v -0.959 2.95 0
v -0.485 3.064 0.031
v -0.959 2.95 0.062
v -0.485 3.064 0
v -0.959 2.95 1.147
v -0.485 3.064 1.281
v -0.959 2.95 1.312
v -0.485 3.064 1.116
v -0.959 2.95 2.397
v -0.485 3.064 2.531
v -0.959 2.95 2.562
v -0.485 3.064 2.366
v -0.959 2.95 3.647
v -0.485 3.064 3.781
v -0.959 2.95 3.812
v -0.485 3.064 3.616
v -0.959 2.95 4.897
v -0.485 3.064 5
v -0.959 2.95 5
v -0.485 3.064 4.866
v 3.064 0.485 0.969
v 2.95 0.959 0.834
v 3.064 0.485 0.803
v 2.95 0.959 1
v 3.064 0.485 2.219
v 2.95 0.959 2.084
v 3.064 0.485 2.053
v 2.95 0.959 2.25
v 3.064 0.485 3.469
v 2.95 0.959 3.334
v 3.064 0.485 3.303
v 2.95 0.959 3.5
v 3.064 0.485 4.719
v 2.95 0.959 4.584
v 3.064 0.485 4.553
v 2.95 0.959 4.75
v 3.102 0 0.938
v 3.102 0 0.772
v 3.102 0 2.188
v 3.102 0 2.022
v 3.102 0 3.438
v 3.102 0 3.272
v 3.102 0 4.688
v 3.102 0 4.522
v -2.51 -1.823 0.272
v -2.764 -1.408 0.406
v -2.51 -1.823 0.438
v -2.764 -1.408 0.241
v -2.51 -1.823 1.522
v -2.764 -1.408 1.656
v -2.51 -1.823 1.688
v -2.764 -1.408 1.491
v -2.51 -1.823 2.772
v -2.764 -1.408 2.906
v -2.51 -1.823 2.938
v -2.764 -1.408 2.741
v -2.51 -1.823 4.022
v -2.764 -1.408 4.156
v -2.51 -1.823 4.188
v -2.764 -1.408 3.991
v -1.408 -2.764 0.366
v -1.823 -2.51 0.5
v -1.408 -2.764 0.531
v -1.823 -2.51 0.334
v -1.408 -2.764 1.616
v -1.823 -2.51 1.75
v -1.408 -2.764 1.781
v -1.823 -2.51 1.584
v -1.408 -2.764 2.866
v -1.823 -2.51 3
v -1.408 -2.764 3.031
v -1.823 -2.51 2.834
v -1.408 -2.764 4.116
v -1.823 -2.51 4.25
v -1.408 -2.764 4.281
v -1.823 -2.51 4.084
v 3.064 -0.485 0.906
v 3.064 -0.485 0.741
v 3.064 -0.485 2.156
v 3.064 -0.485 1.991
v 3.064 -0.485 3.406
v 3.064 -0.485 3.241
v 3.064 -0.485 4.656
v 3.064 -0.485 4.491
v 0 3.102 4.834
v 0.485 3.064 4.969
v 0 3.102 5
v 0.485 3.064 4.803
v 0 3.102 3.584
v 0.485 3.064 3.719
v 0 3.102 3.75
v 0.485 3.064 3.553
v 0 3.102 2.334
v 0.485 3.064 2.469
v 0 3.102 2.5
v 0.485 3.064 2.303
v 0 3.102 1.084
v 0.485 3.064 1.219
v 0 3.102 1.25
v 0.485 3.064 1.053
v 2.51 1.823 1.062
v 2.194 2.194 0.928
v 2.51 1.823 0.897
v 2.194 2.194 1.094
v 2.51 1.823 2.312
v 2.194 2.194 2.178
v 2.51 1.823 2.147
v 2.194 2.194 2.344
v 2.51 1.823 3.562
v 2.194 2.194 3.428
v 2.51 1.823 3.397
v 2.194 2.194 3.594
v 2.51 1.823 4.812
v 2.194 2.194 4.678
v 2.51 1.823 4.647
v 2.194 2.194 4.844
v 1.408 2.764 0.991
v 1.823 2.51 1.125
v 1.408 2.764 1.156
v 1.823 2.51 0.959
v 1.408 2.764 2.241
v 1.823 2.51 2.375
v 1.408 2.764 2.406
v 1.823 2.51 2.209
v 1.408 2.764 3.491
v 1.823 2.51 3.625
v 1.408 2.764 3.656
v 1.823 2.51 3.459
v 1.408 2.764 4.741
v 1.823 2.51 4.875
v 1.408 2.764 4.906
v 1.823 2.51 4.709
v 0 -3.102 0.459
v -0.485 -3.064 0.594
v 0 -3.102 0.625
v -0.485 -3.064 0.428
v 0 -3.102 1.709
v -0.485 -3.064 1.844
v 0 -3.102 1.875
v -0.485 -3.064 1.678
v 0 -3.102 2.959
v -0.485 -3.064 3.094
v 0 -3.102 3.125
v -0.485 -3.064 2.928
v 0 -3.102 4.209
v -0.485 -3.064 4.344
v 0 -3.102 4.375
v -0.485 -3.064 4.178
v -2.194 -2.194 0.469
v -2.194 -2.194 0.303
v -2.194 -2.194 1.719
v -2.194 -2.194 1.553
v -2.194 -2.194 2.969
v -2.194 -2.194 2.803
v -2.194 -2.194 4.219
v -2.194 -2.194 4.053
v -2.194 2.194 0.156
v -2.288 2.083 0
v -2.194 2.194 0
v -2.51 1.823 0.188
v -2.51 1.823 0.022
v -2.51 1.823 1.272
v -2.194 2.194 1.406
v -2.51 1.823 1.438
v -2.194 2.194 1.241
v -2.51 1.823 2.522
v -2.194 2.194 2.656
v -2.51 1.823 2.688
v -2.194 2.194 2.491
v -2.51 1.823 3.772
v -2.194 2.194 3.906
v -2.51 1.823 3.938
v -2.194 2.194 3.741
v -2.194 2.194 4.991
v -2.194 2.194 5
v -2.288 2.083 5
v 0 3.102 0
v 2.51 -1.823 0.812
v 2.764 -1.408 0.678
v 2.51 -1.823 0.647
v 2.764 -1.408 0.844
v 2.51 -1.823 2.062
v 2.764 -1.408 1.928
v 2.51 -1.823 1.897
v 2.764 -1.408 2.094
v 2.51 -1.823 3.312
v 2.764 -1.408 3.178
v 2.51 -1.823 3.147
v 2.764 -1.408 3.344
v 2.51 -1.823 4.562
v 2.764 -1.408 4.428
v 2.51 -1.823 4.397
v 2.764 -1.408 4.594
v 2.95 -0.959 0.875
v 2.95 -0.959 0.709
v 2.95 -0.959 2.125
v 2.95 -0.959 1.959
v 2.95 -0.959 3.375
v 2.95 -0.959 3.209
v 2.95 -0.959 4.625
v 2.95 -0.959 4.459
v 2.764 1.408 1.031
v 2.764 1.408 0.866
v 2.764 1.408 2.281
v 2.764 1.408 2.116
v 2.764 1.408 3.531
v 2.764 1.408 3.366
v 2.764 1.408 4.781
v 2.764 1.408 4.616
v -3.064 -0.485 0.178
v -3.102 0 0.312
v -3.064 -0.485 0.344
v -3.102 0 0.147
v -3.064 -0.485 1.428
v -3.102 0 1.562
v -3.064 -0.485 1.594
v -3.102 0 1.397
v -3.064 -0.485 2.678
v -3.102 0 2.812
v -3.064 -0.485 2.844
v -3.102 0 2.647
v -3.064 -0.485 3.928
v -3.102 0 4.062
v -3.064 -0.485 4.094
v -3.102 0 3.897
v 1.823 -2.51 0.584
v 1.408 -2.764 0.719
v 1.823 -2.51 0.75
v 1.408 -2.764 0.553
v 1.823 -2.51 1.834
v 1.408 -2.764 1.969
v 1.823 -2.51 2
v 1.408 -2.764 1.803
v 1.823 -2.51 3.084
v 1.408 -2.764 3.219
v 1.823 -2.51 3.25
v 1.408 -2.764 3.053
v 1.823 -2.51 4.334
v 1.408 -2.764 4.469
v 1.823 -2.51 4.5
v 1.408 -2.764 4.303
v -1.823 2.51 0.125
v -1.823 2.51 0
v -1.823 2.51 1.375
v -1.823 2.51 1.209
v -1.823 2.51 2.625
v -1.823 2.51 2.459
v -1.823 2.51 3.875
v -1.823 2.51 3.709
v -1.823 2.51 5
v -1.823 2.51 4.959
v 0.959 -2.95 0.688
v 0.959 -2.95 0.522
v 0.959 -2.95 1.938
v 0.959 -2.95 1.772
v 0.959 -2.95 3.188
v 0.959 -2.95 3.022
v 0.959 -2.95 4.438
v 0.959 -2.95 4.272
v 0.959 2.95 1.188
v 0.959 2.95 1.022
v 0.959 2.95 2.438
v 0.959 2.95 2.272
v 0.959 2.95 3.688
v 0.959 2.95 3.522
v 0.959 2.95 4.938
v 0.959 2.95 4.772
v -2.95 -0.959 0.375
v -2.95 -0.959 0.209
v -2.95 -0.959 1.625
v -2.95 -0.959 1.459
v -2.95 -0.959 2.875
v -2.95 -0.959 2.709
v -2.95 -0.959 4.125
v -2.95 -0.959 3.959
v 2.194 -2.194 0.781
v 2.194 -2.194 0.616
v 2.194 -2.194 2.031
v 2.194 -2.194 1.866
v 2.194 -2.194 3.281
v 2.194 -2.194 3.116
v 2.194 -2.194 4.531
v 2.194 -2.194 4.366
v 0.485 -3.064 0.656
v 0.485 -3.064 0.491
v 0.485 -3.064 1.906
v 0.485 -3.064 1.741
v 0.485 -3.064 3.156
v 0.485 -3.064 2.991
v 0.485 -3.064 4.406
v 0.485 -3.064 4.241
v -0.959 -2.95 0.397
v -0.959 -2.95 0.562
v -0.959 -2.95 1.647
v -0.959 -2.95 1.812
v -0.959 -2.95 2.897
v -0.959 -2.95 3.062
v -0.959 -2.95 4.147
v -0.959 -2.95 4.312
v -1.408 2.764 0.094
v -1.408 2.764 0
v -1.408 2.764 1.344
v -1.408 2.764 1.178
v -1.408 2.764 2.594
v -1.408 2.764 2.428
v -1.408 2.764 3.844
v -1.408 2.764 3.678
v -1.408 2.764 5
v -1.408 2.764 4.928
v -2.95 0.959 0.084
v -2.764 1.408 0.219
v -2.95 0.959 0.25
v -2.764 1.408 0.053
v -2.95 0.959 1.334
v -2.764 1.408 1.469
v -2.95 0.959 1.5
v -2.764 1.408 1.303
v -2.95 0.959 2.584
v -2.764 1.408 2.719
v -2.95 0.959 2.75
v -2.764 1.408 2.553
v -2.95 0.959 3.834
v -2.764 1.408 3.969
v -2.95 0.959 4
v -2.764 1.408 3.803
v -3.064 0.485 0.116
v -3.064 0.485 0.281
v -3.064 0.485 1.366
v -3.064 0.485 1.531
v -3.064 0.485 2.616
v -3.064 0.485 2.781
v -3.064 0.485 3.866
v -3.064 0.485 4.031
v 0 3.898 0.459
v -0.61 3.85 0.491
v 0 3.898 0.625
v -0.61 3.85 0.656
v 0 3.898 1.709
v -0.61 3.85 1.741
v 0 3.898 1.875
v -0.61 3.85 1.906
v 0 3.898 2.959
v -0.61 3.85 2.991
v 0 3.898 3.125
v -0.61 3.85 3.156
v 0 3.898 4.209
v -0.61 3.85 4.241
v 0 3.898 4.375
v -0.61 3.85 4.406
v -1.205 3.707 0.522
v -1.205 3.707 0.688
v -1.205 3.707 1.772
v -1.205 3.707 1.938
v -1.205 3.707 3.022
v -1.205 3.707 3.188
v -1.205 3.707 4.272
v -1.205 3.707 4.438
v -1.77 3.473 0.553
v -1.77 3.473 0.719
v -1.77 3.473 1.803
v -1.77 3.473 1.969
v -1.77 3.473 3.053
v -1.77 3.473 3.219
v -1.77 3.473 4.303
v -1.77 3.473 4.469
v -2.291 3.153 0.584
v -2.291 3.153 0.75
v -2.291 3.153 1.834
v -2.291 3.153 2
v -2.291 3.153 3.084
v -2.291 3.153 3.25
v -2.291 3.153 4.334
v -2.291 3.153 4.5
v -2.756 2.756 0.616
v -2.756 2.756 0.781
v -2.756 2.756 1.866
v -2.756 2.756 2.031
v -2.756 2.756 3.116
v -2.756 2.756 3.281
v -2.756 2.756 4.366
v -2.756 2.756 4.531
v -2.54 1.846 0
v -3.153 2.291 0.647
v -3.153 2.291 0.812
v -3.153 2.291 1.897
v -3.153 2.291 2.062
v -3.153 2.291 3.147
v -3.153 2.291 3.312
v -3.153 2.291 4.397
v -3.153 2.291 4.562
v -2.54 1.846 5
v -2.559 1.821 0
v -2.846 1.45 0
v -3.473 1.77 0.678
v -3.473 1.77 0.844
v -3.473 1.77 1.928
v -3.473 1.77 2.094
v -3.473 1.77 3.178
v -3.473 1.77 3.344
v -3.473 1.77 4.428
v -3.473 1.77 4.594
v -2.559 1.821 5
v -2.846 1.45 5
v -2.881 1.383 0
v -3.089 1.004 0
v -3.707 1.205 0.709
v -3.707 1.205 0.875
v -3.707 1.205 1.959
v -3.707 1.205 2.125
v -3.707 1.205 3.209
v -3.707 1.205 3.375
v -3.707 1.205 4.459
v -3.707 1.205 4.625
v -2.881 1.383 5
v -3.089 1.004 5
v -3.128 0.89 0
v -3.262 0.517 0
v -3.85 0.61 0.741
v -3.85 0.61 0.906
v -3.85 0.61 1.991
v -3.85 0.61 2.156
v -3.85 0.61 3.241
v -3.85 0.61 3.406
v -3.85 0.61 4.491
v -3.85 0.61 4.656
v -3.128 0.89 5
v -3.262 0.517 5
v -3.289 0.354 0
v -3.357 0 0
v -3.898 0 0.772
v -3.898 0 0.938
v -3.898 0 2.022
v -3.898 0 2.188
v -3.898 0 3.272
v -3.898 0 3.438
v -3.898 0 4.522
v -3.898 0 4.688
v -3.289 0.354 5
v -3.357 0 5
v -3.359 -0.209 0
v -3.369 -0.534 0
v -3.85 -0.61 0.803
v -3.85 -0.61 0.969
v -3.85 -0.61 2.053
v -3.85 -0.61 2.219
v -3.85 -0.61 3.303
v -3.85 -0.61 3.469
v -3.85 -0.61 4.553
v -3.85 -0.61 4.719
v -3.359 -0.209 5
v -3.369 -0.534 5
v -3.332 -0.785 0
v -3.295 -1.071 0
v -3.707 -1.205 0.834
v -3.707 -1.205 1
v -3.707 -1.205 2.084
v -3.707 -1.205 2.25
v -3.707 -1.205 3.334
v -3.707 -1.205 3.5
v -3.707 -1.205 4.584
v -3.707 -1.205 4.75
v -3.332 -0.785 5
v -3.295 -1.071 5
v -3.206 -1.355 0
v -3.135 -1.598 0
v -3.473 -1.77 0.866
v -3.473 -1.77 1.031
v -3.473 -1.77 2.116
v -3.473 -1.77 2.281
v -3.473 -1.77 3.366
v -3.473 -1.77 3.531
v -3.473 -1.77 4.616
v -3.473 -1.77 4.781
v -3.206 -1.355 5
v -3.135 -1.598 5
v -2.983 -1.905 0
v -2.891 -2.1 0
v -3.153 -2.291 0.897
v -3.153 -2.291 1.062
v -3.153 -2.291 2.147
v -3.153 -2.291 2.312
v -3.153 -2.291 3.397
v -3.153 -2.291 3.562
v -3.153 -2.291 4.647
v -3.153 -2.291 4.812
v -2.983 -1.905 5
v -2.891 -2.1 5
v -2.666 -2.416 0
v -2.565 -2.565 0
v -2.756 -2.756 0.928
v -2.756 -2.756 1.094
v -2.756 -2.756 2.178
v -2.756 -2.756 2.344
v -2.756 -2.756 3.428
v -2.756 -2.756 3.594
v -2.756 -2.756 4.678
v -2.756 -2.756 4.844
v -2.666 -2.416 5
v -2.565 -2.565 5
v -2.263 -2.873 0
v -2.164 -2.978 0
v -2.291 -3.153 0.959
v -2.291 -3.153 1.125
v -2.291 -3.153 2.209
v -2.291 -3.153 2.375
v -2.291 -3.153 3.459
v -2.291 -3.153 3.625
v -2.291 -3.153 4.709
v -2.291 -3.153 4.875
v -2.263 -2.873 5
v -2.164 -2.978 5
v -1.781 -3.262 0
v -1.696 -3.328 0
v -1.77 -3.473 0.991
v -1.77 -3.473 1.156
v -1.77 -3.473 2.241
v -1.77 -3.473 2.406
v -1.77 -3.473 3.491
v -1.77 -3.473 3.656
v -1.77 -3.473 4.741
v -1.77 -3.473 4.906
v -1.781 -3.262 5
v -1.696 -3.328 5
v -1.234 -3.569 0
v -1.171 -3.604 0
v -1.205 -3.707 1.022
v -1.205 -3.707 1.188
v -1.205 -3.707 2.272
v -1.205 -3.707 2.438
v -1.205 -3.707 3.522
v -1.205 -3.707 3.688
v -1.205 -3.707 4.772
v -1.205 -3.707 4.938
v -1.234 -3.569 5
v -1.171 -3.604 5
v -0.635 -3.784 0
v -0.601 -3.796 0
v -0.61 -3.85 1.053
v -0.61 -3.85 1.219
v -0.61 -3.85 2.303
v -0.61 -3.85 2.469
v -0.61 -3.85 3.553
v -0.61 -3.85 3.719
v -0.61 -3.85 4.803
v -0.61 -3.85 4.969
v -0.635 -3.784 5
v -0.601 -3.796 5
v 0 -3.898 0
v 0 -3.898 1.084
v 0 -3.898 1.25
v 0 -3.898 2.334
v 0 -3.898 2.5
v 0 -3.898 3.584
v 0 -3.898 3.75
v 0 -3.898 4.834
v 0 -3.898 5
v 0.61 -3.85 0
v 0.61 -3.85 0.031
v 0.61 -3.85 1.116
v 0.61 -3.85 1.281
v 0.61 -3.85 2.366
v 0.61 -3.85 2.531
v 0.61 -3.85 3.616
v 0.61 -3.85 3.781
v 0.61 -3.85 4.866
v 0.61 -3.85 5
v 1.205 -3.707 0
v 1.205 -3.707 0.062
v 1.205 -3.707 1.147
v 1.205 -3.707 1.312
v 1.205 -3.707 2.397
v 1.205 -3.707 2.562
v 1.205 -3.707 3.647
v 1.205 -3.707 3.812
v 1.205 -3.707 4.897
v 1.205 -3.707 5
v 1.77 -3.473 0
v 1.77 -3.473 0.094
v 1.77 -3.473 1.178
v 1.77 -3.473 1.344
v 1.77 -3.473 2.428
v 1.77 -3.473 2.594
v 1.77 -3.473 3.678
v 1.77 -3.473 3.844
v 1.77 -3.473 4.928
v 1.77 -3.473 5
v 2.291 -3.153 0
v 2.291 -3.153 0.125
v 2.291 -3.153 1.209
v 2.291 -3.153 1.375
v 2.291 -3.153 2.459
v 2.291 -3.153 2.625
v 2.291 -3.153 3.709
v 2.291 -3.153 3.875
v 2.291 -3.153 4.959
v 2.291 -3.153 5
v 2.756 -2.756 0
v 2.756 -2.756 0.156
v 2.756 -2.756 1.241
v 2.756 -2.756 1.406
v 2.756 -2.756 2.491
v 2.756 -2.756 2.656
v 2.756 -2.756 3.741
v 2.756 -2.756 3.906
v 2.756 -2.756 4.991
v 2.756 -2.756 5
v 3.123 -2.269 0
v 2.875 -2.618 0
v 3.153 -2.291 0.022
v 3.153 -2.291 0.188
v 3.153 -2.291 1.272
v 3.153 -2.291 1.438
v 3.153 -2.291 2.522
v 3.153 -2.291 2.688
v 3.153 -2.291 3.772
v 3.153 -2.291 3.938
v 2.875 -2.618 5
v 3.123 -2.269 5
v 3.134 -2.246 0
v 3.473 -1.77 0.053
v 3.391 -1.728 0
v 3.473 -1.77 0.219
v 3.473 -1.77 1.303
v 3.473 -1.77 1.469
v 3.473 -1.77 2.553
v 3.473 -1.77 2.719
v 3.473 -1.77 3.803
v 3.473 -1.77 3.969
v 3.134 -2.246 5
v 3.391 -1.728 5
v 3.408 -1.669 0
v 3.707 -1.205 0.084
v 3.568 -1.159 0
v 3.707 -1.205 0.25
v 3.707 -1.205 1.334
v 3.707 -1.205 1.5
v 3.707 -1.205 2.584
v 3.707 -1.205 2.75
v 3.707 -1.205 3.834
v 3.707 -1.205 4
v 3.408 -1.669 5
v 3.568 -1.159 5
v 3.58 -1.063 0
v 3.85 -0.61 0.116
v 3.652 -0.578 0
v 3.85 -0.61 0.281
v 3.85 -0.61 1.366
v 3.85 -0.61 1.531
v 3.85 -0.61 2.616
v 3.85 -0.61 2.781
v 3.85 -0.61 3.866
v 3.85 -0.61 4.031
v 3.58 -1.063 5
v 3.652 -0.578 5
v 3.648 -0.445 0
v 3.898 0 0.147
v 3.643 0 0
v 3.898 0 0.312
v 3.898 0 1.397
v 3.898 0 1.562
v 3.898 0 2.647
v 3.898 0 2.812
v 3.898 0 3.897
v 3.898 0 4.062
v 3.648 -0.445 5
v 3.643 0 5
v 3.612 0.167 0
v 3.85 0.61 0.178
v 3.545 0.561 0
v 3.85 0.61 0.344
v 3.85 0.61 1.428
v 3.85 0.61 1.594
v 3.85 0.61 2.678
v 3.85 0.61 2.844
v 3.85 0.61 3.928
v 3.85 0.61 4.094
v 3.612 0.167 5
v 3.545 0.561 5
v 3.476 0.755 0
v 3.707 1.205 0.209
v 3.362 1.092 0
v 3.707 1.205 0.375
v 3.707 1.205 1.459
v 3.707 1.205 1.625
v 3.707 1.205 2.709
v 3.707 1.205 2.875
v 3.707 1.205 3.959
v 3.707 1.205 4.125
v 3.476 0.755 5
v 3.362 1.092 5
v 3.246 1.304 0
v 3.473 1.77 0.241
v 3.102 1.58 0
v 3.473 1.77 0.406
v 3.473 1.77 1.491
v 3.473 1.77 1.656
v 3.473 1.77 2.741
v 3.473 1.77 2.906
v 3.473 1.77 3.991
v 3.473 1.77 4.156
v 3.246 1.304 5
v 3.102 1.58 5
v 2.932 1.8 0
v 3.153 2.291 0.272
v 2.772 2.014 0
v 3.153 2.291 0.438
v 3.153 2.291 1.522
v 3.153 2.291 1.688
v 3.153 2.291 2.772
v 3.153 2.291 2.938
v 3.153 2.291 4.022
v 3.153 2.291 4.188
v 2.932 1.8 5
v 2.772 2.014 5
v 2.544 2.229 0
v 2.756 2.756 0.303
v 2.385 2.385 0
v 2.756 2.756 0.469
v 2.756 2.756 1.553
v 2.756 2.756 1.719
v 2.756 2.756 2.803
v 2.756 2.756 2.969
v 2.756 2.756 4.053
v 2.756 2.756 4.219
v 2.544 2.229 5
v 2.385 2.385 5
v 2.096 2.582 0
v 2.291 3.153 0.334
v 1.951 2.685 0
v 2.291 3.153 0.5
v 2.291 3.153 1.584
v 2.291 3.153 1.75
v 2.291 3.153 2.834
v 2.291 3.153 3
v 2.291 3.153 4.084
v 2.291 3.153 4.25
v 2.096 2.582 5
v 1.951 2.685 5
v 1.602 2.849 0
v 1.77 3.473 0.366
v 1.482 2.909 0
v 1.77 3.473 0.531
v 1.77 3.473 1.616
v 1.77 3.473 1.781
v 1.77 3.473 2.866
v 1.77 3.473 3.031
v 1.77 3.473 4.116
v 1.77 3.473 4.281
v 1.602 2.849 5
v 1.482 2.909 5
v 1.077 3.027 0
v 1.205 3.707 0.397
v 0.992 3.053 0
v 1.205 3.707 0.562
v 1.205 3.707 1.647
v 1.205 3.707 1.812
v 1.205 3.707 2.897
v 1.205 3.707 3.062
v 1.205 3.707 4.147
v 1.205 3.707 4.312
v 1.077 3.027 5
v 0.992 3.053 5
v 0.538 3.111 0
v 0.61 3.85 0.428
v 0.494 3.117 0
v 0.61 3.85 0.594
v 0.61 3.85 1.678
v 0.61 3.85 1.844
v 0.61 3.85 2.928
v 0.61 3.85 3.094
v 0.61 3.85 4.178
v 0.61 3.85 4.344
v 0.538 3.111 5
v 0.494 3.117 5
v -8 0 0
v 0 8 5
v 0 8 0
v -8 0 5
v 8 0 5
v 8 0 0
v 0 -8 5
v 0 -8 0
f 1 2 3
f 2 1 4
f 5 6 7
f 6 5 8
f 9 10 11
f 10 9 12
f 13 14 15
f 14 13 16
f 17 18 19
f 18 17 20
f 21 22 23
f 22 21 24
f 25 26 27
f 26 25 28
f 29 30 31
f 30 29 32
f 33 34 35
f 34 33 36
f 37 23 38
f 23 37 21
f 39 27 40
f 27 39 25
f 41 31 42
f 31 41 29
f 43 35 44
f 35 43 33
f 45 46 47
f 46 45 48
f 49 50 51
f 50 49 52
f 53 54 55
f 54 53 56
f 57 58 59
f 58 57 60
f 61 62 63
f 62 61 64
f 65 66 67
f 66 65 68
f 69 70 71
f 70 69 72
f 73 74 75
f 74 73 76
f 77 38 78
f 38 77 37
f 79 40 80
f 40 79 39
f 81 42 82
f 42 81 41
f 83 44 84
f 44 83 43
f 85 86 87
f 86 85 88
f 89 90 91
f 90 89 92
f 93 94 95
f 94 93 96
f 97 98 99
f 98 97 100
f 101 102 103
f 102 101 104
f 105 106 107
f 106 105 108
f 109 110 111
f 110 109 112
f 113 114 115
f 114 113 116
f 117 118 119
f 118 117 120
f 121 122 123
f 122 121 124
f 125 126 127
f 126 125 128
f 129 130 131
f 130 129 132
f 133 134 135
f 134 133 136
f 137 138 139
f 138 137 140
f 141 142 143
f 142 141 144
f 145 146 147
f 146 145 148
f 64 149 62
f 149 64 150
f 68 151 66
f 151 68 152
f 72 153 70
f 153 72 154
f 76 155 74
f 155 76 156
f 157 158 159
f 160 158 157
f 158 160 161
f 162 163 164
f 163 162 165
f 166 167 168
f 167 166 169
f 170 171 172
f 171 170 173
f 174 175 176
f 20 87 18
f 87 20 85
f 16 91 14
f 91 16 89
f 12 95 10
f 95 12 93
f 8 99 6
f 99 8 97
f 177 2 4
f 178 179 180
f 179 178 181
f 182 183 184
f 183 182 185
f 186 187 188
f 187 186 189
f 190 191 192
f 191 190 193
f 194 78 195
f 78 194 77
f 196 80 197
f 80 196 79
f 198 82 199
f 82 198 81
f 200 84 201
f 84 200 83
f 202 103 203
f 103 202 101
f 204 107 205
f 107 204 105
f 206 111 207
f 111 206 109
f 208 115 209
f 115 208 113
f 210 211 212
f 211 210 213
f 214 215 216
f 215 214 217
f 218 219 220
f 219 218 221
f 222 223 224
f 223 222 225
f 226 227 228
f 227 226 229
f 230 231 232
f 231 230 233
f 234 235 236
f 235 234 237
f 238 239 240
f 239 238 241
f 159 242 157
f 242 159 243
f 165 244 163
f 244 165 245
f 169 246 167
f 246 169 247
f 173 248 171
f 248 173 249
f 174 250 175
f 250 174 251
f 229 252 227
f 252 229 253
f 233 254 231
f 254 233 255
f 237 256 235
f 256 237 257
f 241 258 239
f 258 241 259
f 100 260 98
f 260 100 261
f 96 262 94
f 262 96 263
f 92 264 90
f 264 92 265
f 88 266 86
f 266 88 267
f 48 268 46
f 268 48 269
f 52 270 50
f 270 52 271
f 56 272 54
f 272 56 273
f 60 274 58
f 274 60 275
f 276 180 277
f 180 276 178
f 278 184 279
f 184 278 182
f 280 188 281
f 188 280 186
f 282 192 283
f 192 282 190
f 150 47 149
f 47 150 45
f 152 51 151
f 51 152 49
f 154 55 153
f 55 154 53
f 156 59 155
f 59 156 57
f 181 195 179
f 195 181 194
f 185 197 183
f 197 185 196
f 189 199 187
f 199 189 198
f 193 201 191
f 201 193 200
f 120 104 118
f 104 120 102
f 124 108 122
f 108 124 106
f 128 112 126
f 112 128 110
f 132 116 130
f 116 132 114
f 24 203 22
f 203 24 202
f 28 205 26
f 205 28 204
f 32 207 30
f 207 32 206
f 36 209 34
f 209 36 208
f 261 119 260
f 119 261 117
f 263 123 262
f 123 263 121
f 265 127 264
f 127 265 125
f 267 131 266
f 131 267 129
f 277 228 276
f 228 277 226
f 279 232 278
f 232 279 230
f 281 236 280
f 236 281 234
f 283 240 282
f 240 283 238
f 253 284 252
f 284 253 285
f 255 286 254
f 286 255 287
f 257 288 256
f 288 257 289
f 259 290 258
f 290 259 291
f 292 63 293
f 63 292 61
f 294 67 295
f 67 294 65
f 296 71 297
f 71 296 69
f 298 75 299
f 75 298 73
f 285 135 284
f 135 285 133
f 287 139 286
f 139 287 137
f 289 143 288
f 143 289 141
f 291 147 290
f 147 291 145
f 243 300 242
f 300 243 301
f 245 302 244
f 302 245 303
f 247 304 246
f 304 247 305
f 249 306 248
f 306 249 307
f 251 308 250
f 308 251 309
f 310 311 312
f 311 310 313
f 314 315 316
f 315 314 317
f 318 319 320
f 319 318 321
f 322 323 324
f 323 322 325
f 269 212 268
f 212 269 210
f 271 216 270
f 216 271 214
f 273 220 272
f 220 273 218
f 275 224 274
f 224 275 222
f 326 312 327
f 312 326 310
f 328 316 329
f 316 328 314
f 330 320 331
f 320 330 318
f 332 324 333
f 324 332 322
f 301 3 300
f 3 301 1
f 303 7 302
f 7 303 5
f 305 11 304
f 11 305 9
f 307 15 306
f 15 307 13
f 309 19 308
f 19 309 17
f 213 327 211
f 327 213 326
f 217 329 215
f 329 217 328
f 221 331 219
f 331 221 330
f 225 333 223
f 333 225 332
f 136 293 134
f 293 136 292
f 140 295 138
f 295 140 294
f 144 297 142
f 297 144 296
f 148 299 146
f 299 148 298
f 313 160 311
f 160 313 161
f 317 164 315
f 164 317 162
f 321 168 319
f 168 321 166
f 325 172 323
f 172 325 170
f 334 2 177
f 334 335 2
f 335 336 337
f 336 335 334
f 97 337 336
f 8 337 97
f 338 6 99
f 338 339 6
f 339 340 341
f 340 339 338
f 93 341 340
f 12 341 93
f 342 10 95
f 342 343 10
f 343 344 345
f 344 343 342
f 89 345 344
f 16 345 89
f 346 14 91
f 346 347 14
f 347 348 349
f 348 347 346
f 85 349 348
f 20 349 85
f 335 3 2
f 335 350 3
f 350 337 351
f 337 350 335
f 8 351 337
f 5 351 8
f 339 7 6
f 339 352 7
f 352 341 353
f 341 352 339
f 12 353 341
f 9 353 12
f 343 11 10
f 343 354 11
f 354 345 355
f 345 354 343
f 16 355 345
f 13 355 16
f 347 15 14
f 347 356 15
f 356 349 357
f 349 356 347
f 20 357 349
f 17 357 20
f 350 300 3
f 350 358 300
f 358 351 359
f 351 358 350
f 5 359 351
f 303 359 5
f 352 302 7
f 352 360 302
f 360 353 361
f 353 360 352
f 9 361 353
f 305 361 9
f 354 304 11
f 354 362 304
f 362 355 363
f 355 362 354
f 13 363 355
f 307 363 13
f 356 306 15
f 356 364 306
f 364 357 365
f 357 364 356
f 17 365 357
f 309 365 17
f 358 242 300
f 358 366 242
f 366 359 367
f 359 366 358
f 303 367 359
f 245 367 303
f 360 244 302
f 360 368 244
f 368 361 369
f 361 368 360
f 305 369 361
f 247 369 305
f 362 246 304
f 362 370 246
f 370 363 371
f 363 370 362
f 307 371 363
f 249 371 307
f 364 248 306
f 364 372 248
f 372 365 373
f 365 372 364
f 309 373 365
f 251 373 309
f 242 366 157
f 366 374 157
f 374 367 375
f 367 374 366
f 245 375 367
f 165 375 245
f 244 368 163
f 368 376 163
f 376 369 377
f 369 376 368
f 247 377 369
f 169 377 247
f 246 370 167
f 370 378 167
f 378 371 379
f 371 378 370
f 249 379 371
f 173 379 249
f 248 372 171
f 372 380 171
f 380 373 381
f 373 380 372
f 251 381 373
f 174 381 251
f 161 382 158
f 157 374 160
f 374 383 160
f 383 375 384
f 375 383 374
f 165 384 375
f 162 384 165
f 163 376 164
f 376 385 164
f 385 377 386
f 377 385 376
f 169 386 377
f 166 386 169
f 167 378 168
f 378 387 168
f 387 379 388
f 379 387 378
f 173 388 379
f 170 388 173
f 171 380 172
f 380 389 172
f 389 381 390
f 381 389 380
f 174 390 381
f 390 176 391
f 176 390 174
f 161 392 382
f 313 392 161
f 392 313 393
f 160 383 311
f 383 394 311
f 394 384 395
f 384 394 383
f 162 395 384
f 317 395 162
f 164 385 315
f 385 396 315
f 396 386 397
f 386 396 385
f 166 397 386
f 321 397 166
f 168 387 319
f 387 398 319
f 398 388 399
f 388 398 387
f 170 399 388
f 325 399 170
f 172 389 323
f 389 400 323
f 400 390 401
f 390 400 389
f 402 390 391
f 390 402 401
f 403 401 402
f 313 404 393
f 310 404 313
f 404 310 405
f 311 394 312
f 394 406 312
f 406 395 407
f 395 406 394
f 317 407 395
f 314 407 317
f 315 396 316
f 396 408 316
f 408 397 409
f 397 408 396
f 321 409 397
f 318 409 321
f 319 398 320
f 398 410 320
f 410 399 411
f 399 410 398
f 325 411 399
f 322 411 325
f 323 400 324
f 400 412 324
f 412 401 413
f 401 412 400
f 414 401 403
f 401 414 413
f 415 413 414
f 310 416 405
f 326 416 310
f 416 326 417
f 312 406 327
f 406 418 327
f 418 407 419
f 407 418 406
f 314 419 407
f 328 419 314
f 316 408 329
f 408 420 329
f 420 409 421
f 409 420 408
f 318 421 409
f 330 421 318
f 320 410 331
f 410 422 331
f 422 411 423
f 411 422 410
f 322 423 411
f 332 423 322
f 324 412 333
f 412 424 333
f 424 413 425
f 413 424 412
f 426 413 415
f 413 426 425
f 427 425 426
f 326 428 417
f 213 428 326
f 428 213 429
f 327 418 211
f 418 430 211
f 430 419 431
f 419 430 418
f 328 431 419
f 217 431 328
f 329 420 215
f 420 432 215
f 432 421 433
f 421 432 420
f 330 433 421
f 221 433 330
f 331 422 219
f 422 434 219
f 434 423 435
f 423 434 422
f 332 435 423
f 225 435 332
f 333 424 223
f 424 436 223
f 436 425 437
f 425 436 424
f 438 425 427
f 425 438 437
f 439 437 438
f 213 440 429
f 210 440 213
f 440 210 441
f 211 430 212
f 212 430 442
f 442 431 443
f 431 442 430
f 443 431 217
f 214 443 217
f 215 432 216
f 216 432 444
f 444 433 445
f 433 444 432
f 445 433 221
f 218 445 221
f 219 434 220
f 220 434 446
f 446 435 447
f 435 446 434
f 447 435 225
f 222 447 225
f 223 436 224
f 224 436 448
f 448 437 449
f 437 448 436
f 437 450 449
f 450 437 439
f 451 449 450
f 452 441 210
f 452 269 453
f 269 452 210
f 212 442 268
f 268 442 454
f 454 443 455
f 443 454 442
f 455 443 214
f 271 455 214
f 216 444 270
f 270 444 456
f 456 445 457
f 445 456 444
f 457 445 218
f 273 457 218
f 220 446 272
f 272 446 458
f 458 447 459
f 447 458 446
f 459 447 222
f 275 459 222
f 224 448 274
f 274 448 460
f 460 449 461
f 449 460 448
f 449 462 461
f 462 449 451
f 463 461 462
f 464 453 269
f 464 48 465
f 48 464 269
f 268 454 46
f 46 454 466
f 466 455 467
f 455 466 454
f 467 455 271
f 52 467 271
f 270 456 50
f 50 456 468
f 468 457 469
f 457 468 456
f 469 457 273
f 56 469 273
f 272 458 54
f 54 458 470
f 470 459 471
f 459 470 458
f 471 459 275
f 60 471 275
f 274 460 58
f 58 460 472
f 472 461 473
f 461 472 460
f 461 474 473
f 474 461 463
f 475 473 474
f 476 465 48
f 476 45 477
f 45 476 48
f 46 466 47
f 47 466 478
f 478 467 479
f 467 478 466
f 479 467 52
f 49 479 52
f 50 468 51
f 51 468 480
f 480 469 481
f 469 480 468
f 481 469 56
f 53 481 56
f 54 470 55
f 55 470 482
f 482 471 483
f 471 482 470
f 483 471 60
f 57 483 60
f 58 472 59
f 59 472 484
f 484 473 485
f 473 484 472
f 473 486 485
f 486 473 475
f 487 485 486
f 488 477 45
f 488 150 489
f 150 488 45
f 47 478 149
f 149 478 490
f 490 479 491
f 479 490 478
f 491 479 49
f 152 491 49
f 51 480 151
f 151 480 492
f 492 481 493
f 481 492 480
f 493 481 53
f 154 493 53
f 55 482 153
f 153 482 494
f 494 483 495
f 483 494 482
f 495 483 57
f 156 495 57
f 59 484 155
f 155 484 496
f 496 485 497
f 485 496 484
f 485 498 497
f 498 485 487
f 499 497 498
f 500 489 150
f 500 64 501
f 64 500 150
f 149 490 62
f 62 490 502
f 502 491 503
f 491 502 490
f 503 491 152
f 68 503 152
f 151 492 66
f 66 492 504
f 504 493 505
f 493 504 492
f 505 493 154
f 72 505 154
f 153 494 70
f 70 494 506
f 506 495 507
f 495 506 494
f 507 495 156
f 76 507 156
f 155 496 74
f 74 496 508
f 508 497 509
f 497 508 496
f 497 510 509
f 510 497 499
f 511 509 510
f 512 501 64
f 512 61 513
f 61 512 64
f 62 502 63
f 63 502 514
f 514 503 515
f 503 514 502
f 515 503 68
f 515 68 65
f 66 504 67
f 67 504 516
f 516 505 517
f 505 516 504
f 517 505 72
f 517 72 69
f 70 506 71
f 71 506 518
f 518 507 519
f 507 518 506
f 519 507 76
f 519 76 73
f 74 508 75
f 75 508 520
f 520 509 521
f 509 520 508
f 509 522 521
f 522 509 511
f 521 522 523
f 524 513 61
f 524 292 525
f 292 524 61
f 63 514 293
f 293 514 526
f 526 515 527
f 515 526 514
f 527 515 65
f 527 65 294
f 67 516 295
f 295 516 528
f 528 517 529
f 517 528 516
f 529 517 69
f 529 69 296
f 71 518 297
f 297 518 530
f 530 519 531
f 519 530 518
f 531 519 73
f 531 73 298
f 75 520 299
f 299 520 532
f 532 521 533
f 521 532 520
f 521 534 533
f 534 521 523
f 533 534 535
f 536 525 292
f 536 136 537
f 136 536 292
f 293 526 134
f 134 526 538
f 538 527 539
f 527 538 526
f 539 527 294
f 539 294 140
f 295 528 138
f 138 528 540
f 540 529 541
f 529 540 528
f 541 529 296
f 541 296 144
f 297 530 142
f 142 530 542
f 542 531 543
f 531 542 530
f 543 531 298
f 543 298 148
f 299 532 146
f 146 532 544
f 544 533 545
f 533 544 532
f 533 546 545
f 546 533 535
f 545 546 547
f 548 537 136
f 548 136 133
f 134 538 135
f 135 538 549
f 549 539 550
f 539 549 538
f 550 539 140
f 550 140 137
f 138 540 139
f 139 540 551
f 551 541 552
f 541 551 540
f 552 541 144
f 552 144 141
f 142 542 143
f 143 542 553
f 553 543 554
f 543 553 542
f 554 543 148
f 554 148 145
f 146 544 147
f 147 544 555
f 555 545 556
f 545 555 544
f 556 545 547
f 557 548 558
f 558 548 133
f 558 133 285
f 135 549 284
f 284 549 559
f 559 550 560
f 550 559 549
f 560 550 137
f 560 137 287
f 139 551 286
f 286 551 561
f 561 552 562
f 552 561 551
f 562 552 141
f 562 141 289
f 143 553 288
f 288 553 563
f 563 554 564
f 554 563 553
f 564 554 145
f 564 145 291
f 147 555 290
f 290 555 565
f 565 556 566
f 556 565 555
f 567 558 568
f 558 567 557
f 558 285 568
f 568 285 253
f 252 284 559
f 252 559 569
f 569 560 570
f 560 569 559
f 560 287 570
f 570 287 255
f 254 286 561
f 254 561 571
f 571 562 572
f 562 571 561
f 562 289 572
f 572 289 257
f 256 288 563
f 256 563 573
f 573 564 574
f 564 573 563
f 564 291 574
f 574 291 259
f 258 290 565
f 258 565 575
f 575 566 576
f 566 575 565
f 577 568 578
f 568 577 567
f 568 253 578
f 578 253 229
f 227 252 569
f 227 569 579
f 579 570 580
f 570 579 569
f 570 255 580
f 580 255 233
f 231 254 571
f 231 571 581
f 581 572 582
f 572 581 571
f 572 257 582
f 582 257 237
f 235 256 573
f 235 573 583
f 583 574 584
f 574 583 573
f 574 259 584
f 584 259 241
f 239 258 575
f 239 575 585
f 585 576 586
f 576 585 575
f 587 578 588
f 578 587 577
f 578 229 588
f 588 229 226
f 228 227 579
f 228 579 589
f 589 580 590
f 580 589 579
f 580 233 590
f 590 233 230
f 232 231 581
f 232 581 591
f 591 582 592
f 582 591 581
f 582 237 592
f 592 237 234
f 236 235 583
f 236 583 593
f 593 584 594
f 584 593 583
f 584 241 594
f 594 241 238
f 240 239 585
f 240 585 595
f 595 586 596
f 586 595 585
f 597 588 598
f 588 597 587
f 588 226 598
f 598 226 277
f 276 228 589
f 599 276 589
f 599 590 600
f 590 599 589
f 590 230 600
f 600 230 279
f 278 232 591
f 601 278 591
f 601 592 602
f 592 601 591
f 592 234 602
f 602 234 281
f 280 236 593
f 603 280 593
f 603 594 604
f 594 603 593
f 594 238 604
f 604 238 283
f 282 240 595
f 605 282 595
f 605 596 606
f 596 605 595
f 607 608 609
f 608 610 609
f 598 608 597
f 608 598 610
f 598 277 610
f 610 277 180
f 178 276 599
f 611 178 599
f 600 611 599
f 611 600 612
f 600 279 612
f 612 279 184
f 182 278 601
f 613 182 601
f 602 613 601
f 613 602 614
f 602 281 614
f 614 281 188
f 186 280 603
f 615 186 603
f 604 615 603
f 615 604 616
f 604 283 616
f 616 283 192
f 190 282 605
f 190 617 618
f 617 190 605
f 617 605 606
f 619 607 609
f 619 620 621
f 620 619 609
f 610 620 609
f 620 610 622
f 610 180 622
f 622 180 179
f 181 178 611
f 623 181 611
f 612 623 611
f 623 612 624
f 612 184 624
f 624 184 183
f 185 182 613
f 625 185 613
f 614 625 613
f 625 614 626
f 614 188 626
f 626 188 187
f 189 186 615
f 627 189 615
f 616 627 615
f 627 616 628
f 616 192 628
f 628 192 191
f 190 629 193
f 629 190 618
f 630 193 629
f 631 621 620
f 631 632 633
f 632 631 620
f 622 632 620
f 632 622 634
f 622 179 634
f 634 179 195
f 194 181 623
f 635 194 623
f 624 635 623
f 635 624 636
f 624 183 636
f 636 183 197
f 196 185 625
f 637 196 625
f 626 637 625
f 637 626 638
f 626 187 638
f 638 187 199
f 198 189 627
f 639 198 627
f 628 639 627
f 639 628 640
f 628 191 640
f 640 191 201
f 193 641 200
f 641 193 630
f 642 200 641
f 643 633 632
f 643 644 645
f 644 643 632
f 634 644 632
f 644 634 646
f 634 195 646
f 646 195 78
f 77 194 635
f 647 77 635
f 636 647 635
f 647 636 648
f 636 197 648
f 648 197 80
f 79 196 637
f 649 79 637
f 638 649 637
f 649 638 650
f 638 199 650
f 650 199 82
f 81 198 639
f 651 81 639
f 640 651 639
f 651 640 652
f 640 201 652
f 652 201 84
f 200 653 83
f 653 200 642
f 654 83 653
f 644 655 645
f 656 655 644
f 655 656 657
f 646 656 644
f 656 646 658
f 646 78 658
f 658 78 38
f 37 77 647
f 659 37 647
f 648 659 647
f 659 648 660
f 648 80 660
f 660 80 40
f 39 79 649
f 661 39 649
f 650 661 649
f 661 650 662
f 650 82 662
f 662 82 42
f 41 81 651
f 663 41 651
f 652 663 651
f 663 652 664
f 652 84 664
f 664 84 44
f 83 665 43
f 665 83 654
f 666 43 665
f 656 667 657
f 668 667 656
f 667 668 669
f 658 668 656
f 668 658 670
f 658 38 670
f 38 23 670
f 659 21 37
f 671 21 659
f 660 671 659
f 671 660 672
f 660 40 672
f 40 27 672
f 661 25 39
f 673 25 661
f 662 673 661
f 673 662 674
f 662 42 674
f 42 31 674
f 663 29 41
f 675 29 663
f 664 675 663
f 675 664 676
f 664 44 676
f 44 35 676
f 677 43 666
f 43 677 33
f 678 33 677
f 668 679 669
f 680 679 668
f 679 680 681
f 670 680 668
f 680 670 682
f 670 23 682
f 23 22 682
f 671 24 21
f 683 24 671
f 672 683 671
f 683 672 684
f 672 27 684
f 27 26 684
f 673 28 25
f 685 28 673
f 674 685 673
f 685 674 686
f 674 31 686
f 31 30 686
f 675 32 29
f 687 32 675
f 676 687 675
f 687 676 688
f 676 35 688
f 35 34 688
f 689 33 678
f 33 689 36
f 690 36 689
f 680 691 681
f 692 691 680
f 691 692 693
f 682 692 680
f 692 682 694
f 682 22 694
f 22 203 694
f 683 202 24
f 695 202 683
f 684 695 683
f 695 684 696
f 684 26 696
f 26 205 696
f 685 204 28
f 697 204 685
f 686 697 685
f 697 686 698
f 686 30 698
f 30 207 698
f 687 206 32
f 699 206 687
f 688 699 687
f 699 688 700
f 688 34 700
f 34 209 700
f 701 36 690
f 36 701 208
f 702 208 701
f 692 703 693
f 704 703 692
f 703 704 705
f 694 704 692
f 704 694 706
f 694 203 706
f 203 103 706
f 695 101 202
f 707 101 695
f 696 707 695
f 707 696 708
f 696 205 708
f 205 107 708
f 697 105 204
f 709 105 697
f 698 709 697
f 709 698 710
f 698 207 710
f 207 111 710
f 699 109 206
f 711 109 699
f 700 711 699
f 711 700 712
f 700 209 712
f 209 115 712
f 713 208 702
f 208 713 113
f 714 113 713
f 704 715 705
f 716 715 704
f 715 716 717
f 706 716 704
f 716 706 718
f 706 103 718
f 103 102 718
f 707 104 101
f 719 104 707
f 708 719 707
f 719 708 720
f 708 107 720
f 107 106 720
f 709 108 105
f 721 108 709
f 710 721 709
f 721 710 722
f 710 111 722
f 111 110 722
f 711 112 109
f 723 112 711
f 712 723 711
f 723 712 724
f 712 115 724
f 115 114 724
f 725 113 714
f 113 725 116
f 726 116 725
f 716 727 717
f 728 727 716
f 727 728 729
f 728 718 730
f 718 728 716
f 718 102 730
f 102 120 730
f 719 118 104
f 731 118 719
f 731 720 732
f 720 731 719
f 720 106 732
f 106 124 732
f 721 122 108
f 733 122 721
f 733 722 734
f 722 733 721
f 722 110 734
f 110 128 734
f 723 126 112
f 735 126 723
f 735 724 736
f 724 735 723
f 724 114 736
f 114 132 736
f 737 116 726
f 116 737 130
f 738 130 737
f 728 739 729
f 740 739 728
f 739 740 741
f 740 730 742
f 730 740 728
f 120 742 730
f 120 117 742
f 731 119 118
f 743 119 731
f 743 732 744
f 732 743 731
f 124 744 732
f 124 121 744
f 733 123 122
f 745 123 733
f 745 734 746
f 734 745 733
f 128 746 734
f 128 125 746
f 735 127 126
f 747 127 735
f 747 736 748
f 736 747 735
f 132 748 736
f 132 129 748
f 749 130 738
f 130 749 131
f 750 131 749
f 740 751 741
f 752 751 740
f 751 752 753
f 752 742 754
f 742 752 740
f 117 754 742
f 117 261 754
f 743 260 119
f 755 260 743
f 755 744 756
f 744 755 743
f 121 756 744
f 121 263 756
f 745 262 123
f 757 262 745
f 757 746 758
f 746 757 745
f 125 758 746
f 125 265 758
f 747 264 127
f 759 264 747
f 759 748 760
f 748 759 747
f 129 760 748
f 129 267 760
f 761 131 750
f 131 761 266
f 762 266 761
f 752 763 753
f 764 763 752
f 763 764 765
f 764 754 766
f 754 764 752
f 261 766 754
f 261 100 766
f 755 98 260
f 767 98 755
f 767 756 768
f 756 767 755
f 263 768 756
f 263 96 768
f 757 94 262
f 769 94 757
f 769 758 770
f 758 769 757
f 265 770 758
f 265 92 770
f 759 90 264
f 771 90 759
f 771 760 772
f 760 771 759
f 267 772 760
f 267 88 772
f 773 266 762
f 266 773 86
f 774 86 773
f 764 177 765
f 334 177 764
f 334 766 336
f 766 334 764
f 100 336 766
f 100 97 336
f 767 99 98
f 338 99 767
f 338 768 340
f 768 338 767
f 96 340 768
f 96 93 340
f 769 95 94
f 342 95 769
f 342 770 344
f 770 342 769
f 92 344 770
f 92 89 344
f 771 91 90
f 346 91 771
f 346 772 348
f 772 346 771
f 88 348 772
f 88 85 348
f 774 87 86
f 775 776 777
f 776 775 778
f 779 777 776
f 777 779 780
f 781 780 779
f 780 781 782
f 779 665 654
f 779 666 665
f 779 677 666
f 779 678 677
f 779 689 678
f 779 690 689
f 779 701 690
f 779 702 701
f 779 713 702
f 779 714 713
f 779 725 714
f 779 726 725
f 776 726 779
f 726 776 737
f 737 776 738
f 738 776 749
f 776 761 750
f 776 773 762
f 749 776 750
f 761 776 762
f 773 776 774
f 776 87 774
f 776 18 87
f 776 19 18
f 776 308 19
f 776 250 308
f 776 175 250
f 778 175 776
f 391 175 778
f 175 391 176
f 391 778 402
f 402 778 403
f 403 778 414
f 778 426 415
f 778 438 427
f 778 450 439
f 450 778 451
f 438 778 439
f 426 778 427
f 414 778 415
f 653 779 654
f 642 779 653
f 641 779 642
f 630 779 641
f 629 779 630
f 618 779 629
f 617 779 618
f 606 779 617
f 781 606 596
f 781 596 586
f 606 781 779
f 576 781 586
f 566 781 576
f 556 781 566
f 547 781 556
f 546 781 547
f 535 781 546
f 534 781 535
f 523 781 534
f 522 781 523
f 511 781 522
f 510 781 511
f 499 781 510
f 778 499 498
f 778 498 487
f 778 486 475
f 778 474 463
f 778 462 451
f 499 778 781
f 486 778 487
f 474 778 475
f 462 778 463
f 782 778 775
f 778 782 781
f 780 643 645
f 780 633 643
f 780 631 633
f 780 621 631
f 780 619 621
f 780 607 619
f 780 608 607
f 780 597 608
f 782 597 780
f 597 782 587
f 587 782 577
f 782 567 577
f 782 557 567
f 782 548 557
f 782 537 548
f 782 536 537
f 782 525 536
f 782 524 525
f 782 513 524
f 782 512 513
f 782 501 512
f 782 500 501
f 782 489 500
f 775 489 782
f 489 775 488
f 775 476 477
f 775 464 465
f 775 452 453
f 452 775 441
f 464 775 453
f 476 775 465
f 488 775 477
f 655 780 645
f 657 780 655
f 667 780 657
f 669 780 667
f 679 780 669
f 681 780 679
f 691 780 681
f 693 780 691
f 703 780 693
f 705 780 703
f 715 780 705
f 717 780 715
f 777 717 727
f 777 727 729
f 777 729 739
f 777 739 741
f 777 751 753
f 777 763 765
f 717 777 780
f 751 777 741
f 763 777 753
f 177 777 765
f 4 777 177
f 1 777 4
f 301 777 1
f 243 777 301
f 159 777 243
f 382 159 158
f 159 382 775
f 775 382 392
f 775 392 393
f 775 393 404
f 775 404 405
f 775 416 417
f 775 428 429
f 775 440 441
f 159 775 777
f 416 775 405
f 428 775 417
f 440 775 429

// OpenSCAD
// file: Naca_sweep.scad
// Naca4_sweep.scad - sweep library
// Code: Rudolf Huttary, Berlin 
// June 2015
// commercial use prohibited

//use <naca4.scad>

//example1(); 
//rotate([80, 180, 130])
//example(); 

// sweep from NACA1480 to NACA6480 (len = 230 mm, winding y,z = 80°
// sweeps generates a single polyhedron from multiple datasets
/*
module example()
{
  N = 40; 
  sweep(gen_dat(N=5, dz=1,N=N)); 
  
  // specific generator function
  function gen_dat(M=10,dz=.1,N=10) = [for (i=[1:dz:M])   
    let( L = length(i))
    let( af = vec3D(
        airfoil_data([.1,.5,thickness(i)], L=length(i), N = N)))
    T_(-L/2, 0, (i+1)*2, af)];  // translate airfoil
  
  function thickness(i) = .5*sin(i*i)+.1; 
  function length(i) = (60+sin(12*(i-3))*30); 
}
*/

module help()
{
  echo(str("\n\nList of signatures in lib:\n=================\n", 
  "sweep(dat, convexity = 5, showslices = false, plaincaps = true)  // dat - vec of vec2, with vec1 = airfoil_data\n", 
  "function vec3D(v, z=0)  // expand vec2 to vec3",
  "function rot(w=0, p) // rotate vec2",
  "function T_(x=0, y=0, z=0, v) // translates vec of vec3\n", 
  "function R_(x=0, y=0, z=0, v) // rotates vec of vec3\n", 
  "function Rx_(x=0, v) // x-rotates vec of vec3\n", 
  "function Ry_(y=0, v) // y-rotates vec of vec3\n", 
  "function Rz_(z=0, v) // z-rotates vec of vec3\n", 
  "function T_(x=0, y=0, z=0, v) // translates vec of vec3\n", 
  "function Tx_(x=0, v) // x-translates vec of vec3\n", 
  "function Ry_(y=0, v) // y-translates vec of vec3\n", 
  "function Rz_(z=0, v) // z-translates vec of vec3\n", 
  "function S_(x=0, y=0, z=0, v) // scales vec of vec3\n", 
  "function Sx_(x=0, v) // x-translates vec of vec3\n", 
  "function Sy_(x=0, v) // y-translates vec of vec3\n", 
  "function Sz_(x=0, v) // z-translates vec of vec3\n", 
  "=================\n")); 
}


// generate polyhedron from multiple airfoil_datasets
// dat - vec of vec1, with vec1 = simple polygon like airfoil_data, > 3 points per dataset expected
module sweep(dat, convexity = 5, showslices = false, plaincaps = true) 
{
  n = len(dat);     // # datasets
  l = len(dat[0]);  // points per dataset 
  if(l<=3) 
    echo("ERROR: sweep() expects more than 3 points per dataset"); 
  else
  {
    if(n==1) 
      polyhedron(points = dat[0], faces = [count(l-1, 0)]);
    else{
    first = plaincaps?[count(l-1, 0)]: 
            faces_polygon(l, true);  // triangulate first dataset
    last = plaincaps?[count((n-1)*l,(n)*l-1)]: 
            faces_shift((n-2)*l, faces_polygon(l, false)); // triangulate last dataset
    if (showslices)
      for(i=[0:n-1])
        sweep([dat[i]]); 
    else
      if (n<2)  // this case is also used recursively for showslices
        polyhedron(points = flat(), faces  = last, convexity = 5); 
      else
      {
        polyhedron(points = flat(), 
                   faces  = concat(first, last, faces_sweep(l,n)), convexity = 5); 
      }
    }
  }
  function count(a, b) = let(st = (a<b?1:-1))[for (i=[a:st:b]) i]; 
  function faces_shift(d, dat) = [for (i=[0:len(dat)-1]) dat[i] + [d, d, d]]; 
  function flat() = [for (i=[0:n-1], j=[0:l-1]) dat[i][j]]; 
}

function del(A, n) = [for(i=[0:len(A)-1]) if (n!=i)A[i]]; 

//// composition stuff for polyhedron
  function faces_sweep(l, n=1) = let(M = n*l) 
      concat([[0,l,l-1]],   // first face
      [for (i=[0:l*(n-1)-2], j = [0,1])
        j==0? [i, i+1, (i+l)] : [i+1, (i+l+1), i+l]], 
      [[n*l-1, (n-1)*l-1, (n-1)*l]]) // last face
      ;
    
  function faces_polygon(l, first = true) = let(odd = (l%2==1), d=first?0:l)
    let(res = odd?concat([[d,d+1,d+l-1]],
      [for (i=[1:(l-3)/2], j=[0,1])(j==0)?[d+i,d+i+1,d+l-i]:[d+i+1,d+l-i-1, d+l-i]]):
      [for (i=[0:(l-4)/2], j=[0,1])(j==0)?[d+i,d+i+1,d+l-i-1]:[d+i+1,d+l-i-2, d+l-i-1]])
    first?facerev(res):res;
    
  function facerev(dat) = [for (i=[0:len(dat)-1]) [dat[i][0],dat[i][2],dat[i][1]]]; 



//// vector and vector set operation stuff ///////////////////////
//// Expand 2D vector into 3D
function vec3D(v, z=0) = [for(i = [0:len(v)-1]) 
  len(v[i])==2?[v[i][0], v[i][1], z]:v[i]+[0, 0, z]]; 

// Translation - 1D, 2D, 3D point vector //////////////////////////
// vector along all axes
function T_(x=0, y=0, z=0, v) = 
  //let(x_ = (len(x)==3)?x:[x, y, z])
  let(x_ = [x, y, z])
  [for (i=[0:len(v)-1]) T__(x_[0], x_[1], x_[2], p=v[i])]; 
/// vector along one axis
function Tx_(x=0, v) = T_(x=x, v=v); 
function Ty_(y=0, v) = T_(y=y, v=v); 
function Tz_(z=0, v) = T_(z=z, v=v); 
/// point along all axes 1D, 2D, 3D allowed
function T__(x=0, y=0, z=0, p) = len(p)==3?p+[x, y, z]:len(p)==2?p+[x, y]:p+x; 

//// Rotation - 2D, 3D point vector ///////////////////////////////////
// vector around all axes 
function R_(x=0, y=0, z=0, v) =             // 2D vectors allowed 
  //let(x_ = (len(x)==3)?x:[x, y, z])
  let(x_ = [x, y, z])
  len(v[0])==3?Rx_(x_[0], Ry_(x_[1], Rz_(x_[2], v))):
  [for(i = [0:len(v)-1]) rot(x_[2], v[i])];  
// vector around one axis
function Rx_(w, A) = A*[[1, 0, 0], [0, cos(w), sin(w)], [0, -sin(w), cos(w)]]; 
function Ry_(w, A) = A*[[cos(w), 0, sin(w)], [0, 1, 0], [-sin(w), 0, cos(w)]]; 
function Rz_(w, A) = A*[[cos(w), sin(w), 0], [-sin(w), cos(w), 0], [0, 0, 1]]; 


//// Scale - 2D, 3D point vector ///////////////////////////////////
// vector along all axes 
function S_(x=1, y=1, z=1, v) = 
  [for (i=[0:len(v)-1]) S__(x,y,z, v[i])]; 
// vector along one axis
function Sx_(x=0, v) = S_(x=x, v=v); 
function Sy_(y=0, v) = S_(y=y, v=v); 
function Sz_(z=0, v) = S_(z=z, v=v); 
// single point in 2D
function S__(x=1, y=1, z=1, p) = 
  len(p)==3?[p[0]*x, p[1]*y, p[2]*z]:len(p)==2?[p[0]*x+p[1]*y]:[p[0]*x]; 

 
 
// main file
// Threading.scad - library for threadings
// Autor: Rudolf Huttary, Berlin 2016 

use <Naca_sweep.scad> // http://www.thingiverse.com/thing:900137

// examples 
showexample = 10;   // choose your example number

example(showexample)
{
// #1 ACME thread
  threading(pitch = 2, d=20, windings = 5, angle = 29); 

// #2 threaded rod 20°
  threading(pitch = 2, d=20, windings = 30, angle = 20, full = true); 

// #3 nut for threaded rod 20°
  Threading(pitch = 2, d=20, windings = 10, angle = 20, full = true); 

// #4 nut for threaded rod 20°, own diameter 25 mm, hires 
  Threading(D = 25, pitch = 2, d=20, windings = 10, angle = 20, full = true, step = 50, $fn=100); 

// #5 triple helix threaded rod
  threading(pitch = 2, d=20, windings = 30, helices = 3, angle = 20, full = true); 

// #6 toothed rod (no pitch) 
   threading(helices = 0, angle = 20, full = true); 

// #7 toothed cube (no pitch) 
   threading(helices = 0, angle = 60, full = true, steps=4); 

// #8 M8 hex bolt
   union(){
     threading(pitch = 1.25, d=8, windings=20, full=true); cylinder(d=14.6, h=4, $fn=6);} 
// #9 M8 hex nut
   Threading(D=14.6, pitch = 1.25, d=8, windings=5, full=true, $fn=6);  
// #10 M8 four socket nut
   Threading(D=16, pitch = 1.25, d=8, windings=5, full=true, $fn=4);  
}

module example(number=0) if(number) children(number-1);

help(); 
module help()
{
  helpstr = 
  "Thread library - Rudolf Huttary \n
    D = {0=auto};  // Cyl diameter Threading() \n
    d = 6;         // outer diameter thread() \n
    windings = 10; // number of windings \n
    helices = 1;   // number of threads \n
    angle = 60;    // open angle <76, bolts: 60°, ACME: 29°, toothed Racks: 20° \n
    steps = 40;    // resolution \n
    help();        // show help in console
    threading(pitch = 1, d = 6, windings = 10, helices = 1, angle = 60, steps=40, full = false) \n
    Threading(D = 0, pitch = 1, r = 6, windings = 10, helices = 1, angle = 60, steps=40) \n
  ";
  echo (helpstr);
}

//Threading(R=12, pitch = pitch, r=radius, windings= windings, angle = angle); 

module Threading(D = 0, pitch = 1, d = 12, windings = 10, helices = 1, angle = 60, steps=40)
{
  R = D==0?d/2+2*pitch/PI:D/2; 
  translate([0,0,-pitch])
  difference()
  { 
    translate([0,0,pitch]) 
    cylinder (r=R, h =pitch*(windings-helices)); 
    threading(pitch, d, windings, helices, angle, steps, true); 
  }
}

module threading(pitch = 1, d = 12, windings = 10, helices = 1, angle = 60, steps=40, full = false)
{  // tricky: glue two 180° pieces together to get a proper manifold  
  r = d/2;
  Steps = steps/2; 
  Pitch = pitch*helices; 
  if(full) cylinder(r = r-.5-pitch/PI, h=pitch*(windings+helices), $fn=steps); 
  sweep(gen_dat());   // half screw
  rotate([0, 0, 180]) translate([0, 0, Pitch/2])
  sweep(gen_dat());   // half screw

  function gen_dat() = let(ang = 180, bar = R_(180, -90, 0, Ty_(-r+.5, vec3D(pitch/PI*Rack(windings, angle)))))
        [for (i=[0:Steps]) Tz_(i/2/Steps*Pitch, Rz_(i*ang/Steps, bar))]; 

  function Rack(w, angle) = 
     concat([[0, 2]], [for (i=[0:windings-1], j=[0:3])
     let(t = [ [0, 1], [2*tan(angle/2), -1], [PI/2, -1], [2*tan(angle/2)+PI/2, 1]])
        [t[j][0]+i*PI, t[j][1]]], [[w*PI, 1], [w*PI, 2]]);
}
